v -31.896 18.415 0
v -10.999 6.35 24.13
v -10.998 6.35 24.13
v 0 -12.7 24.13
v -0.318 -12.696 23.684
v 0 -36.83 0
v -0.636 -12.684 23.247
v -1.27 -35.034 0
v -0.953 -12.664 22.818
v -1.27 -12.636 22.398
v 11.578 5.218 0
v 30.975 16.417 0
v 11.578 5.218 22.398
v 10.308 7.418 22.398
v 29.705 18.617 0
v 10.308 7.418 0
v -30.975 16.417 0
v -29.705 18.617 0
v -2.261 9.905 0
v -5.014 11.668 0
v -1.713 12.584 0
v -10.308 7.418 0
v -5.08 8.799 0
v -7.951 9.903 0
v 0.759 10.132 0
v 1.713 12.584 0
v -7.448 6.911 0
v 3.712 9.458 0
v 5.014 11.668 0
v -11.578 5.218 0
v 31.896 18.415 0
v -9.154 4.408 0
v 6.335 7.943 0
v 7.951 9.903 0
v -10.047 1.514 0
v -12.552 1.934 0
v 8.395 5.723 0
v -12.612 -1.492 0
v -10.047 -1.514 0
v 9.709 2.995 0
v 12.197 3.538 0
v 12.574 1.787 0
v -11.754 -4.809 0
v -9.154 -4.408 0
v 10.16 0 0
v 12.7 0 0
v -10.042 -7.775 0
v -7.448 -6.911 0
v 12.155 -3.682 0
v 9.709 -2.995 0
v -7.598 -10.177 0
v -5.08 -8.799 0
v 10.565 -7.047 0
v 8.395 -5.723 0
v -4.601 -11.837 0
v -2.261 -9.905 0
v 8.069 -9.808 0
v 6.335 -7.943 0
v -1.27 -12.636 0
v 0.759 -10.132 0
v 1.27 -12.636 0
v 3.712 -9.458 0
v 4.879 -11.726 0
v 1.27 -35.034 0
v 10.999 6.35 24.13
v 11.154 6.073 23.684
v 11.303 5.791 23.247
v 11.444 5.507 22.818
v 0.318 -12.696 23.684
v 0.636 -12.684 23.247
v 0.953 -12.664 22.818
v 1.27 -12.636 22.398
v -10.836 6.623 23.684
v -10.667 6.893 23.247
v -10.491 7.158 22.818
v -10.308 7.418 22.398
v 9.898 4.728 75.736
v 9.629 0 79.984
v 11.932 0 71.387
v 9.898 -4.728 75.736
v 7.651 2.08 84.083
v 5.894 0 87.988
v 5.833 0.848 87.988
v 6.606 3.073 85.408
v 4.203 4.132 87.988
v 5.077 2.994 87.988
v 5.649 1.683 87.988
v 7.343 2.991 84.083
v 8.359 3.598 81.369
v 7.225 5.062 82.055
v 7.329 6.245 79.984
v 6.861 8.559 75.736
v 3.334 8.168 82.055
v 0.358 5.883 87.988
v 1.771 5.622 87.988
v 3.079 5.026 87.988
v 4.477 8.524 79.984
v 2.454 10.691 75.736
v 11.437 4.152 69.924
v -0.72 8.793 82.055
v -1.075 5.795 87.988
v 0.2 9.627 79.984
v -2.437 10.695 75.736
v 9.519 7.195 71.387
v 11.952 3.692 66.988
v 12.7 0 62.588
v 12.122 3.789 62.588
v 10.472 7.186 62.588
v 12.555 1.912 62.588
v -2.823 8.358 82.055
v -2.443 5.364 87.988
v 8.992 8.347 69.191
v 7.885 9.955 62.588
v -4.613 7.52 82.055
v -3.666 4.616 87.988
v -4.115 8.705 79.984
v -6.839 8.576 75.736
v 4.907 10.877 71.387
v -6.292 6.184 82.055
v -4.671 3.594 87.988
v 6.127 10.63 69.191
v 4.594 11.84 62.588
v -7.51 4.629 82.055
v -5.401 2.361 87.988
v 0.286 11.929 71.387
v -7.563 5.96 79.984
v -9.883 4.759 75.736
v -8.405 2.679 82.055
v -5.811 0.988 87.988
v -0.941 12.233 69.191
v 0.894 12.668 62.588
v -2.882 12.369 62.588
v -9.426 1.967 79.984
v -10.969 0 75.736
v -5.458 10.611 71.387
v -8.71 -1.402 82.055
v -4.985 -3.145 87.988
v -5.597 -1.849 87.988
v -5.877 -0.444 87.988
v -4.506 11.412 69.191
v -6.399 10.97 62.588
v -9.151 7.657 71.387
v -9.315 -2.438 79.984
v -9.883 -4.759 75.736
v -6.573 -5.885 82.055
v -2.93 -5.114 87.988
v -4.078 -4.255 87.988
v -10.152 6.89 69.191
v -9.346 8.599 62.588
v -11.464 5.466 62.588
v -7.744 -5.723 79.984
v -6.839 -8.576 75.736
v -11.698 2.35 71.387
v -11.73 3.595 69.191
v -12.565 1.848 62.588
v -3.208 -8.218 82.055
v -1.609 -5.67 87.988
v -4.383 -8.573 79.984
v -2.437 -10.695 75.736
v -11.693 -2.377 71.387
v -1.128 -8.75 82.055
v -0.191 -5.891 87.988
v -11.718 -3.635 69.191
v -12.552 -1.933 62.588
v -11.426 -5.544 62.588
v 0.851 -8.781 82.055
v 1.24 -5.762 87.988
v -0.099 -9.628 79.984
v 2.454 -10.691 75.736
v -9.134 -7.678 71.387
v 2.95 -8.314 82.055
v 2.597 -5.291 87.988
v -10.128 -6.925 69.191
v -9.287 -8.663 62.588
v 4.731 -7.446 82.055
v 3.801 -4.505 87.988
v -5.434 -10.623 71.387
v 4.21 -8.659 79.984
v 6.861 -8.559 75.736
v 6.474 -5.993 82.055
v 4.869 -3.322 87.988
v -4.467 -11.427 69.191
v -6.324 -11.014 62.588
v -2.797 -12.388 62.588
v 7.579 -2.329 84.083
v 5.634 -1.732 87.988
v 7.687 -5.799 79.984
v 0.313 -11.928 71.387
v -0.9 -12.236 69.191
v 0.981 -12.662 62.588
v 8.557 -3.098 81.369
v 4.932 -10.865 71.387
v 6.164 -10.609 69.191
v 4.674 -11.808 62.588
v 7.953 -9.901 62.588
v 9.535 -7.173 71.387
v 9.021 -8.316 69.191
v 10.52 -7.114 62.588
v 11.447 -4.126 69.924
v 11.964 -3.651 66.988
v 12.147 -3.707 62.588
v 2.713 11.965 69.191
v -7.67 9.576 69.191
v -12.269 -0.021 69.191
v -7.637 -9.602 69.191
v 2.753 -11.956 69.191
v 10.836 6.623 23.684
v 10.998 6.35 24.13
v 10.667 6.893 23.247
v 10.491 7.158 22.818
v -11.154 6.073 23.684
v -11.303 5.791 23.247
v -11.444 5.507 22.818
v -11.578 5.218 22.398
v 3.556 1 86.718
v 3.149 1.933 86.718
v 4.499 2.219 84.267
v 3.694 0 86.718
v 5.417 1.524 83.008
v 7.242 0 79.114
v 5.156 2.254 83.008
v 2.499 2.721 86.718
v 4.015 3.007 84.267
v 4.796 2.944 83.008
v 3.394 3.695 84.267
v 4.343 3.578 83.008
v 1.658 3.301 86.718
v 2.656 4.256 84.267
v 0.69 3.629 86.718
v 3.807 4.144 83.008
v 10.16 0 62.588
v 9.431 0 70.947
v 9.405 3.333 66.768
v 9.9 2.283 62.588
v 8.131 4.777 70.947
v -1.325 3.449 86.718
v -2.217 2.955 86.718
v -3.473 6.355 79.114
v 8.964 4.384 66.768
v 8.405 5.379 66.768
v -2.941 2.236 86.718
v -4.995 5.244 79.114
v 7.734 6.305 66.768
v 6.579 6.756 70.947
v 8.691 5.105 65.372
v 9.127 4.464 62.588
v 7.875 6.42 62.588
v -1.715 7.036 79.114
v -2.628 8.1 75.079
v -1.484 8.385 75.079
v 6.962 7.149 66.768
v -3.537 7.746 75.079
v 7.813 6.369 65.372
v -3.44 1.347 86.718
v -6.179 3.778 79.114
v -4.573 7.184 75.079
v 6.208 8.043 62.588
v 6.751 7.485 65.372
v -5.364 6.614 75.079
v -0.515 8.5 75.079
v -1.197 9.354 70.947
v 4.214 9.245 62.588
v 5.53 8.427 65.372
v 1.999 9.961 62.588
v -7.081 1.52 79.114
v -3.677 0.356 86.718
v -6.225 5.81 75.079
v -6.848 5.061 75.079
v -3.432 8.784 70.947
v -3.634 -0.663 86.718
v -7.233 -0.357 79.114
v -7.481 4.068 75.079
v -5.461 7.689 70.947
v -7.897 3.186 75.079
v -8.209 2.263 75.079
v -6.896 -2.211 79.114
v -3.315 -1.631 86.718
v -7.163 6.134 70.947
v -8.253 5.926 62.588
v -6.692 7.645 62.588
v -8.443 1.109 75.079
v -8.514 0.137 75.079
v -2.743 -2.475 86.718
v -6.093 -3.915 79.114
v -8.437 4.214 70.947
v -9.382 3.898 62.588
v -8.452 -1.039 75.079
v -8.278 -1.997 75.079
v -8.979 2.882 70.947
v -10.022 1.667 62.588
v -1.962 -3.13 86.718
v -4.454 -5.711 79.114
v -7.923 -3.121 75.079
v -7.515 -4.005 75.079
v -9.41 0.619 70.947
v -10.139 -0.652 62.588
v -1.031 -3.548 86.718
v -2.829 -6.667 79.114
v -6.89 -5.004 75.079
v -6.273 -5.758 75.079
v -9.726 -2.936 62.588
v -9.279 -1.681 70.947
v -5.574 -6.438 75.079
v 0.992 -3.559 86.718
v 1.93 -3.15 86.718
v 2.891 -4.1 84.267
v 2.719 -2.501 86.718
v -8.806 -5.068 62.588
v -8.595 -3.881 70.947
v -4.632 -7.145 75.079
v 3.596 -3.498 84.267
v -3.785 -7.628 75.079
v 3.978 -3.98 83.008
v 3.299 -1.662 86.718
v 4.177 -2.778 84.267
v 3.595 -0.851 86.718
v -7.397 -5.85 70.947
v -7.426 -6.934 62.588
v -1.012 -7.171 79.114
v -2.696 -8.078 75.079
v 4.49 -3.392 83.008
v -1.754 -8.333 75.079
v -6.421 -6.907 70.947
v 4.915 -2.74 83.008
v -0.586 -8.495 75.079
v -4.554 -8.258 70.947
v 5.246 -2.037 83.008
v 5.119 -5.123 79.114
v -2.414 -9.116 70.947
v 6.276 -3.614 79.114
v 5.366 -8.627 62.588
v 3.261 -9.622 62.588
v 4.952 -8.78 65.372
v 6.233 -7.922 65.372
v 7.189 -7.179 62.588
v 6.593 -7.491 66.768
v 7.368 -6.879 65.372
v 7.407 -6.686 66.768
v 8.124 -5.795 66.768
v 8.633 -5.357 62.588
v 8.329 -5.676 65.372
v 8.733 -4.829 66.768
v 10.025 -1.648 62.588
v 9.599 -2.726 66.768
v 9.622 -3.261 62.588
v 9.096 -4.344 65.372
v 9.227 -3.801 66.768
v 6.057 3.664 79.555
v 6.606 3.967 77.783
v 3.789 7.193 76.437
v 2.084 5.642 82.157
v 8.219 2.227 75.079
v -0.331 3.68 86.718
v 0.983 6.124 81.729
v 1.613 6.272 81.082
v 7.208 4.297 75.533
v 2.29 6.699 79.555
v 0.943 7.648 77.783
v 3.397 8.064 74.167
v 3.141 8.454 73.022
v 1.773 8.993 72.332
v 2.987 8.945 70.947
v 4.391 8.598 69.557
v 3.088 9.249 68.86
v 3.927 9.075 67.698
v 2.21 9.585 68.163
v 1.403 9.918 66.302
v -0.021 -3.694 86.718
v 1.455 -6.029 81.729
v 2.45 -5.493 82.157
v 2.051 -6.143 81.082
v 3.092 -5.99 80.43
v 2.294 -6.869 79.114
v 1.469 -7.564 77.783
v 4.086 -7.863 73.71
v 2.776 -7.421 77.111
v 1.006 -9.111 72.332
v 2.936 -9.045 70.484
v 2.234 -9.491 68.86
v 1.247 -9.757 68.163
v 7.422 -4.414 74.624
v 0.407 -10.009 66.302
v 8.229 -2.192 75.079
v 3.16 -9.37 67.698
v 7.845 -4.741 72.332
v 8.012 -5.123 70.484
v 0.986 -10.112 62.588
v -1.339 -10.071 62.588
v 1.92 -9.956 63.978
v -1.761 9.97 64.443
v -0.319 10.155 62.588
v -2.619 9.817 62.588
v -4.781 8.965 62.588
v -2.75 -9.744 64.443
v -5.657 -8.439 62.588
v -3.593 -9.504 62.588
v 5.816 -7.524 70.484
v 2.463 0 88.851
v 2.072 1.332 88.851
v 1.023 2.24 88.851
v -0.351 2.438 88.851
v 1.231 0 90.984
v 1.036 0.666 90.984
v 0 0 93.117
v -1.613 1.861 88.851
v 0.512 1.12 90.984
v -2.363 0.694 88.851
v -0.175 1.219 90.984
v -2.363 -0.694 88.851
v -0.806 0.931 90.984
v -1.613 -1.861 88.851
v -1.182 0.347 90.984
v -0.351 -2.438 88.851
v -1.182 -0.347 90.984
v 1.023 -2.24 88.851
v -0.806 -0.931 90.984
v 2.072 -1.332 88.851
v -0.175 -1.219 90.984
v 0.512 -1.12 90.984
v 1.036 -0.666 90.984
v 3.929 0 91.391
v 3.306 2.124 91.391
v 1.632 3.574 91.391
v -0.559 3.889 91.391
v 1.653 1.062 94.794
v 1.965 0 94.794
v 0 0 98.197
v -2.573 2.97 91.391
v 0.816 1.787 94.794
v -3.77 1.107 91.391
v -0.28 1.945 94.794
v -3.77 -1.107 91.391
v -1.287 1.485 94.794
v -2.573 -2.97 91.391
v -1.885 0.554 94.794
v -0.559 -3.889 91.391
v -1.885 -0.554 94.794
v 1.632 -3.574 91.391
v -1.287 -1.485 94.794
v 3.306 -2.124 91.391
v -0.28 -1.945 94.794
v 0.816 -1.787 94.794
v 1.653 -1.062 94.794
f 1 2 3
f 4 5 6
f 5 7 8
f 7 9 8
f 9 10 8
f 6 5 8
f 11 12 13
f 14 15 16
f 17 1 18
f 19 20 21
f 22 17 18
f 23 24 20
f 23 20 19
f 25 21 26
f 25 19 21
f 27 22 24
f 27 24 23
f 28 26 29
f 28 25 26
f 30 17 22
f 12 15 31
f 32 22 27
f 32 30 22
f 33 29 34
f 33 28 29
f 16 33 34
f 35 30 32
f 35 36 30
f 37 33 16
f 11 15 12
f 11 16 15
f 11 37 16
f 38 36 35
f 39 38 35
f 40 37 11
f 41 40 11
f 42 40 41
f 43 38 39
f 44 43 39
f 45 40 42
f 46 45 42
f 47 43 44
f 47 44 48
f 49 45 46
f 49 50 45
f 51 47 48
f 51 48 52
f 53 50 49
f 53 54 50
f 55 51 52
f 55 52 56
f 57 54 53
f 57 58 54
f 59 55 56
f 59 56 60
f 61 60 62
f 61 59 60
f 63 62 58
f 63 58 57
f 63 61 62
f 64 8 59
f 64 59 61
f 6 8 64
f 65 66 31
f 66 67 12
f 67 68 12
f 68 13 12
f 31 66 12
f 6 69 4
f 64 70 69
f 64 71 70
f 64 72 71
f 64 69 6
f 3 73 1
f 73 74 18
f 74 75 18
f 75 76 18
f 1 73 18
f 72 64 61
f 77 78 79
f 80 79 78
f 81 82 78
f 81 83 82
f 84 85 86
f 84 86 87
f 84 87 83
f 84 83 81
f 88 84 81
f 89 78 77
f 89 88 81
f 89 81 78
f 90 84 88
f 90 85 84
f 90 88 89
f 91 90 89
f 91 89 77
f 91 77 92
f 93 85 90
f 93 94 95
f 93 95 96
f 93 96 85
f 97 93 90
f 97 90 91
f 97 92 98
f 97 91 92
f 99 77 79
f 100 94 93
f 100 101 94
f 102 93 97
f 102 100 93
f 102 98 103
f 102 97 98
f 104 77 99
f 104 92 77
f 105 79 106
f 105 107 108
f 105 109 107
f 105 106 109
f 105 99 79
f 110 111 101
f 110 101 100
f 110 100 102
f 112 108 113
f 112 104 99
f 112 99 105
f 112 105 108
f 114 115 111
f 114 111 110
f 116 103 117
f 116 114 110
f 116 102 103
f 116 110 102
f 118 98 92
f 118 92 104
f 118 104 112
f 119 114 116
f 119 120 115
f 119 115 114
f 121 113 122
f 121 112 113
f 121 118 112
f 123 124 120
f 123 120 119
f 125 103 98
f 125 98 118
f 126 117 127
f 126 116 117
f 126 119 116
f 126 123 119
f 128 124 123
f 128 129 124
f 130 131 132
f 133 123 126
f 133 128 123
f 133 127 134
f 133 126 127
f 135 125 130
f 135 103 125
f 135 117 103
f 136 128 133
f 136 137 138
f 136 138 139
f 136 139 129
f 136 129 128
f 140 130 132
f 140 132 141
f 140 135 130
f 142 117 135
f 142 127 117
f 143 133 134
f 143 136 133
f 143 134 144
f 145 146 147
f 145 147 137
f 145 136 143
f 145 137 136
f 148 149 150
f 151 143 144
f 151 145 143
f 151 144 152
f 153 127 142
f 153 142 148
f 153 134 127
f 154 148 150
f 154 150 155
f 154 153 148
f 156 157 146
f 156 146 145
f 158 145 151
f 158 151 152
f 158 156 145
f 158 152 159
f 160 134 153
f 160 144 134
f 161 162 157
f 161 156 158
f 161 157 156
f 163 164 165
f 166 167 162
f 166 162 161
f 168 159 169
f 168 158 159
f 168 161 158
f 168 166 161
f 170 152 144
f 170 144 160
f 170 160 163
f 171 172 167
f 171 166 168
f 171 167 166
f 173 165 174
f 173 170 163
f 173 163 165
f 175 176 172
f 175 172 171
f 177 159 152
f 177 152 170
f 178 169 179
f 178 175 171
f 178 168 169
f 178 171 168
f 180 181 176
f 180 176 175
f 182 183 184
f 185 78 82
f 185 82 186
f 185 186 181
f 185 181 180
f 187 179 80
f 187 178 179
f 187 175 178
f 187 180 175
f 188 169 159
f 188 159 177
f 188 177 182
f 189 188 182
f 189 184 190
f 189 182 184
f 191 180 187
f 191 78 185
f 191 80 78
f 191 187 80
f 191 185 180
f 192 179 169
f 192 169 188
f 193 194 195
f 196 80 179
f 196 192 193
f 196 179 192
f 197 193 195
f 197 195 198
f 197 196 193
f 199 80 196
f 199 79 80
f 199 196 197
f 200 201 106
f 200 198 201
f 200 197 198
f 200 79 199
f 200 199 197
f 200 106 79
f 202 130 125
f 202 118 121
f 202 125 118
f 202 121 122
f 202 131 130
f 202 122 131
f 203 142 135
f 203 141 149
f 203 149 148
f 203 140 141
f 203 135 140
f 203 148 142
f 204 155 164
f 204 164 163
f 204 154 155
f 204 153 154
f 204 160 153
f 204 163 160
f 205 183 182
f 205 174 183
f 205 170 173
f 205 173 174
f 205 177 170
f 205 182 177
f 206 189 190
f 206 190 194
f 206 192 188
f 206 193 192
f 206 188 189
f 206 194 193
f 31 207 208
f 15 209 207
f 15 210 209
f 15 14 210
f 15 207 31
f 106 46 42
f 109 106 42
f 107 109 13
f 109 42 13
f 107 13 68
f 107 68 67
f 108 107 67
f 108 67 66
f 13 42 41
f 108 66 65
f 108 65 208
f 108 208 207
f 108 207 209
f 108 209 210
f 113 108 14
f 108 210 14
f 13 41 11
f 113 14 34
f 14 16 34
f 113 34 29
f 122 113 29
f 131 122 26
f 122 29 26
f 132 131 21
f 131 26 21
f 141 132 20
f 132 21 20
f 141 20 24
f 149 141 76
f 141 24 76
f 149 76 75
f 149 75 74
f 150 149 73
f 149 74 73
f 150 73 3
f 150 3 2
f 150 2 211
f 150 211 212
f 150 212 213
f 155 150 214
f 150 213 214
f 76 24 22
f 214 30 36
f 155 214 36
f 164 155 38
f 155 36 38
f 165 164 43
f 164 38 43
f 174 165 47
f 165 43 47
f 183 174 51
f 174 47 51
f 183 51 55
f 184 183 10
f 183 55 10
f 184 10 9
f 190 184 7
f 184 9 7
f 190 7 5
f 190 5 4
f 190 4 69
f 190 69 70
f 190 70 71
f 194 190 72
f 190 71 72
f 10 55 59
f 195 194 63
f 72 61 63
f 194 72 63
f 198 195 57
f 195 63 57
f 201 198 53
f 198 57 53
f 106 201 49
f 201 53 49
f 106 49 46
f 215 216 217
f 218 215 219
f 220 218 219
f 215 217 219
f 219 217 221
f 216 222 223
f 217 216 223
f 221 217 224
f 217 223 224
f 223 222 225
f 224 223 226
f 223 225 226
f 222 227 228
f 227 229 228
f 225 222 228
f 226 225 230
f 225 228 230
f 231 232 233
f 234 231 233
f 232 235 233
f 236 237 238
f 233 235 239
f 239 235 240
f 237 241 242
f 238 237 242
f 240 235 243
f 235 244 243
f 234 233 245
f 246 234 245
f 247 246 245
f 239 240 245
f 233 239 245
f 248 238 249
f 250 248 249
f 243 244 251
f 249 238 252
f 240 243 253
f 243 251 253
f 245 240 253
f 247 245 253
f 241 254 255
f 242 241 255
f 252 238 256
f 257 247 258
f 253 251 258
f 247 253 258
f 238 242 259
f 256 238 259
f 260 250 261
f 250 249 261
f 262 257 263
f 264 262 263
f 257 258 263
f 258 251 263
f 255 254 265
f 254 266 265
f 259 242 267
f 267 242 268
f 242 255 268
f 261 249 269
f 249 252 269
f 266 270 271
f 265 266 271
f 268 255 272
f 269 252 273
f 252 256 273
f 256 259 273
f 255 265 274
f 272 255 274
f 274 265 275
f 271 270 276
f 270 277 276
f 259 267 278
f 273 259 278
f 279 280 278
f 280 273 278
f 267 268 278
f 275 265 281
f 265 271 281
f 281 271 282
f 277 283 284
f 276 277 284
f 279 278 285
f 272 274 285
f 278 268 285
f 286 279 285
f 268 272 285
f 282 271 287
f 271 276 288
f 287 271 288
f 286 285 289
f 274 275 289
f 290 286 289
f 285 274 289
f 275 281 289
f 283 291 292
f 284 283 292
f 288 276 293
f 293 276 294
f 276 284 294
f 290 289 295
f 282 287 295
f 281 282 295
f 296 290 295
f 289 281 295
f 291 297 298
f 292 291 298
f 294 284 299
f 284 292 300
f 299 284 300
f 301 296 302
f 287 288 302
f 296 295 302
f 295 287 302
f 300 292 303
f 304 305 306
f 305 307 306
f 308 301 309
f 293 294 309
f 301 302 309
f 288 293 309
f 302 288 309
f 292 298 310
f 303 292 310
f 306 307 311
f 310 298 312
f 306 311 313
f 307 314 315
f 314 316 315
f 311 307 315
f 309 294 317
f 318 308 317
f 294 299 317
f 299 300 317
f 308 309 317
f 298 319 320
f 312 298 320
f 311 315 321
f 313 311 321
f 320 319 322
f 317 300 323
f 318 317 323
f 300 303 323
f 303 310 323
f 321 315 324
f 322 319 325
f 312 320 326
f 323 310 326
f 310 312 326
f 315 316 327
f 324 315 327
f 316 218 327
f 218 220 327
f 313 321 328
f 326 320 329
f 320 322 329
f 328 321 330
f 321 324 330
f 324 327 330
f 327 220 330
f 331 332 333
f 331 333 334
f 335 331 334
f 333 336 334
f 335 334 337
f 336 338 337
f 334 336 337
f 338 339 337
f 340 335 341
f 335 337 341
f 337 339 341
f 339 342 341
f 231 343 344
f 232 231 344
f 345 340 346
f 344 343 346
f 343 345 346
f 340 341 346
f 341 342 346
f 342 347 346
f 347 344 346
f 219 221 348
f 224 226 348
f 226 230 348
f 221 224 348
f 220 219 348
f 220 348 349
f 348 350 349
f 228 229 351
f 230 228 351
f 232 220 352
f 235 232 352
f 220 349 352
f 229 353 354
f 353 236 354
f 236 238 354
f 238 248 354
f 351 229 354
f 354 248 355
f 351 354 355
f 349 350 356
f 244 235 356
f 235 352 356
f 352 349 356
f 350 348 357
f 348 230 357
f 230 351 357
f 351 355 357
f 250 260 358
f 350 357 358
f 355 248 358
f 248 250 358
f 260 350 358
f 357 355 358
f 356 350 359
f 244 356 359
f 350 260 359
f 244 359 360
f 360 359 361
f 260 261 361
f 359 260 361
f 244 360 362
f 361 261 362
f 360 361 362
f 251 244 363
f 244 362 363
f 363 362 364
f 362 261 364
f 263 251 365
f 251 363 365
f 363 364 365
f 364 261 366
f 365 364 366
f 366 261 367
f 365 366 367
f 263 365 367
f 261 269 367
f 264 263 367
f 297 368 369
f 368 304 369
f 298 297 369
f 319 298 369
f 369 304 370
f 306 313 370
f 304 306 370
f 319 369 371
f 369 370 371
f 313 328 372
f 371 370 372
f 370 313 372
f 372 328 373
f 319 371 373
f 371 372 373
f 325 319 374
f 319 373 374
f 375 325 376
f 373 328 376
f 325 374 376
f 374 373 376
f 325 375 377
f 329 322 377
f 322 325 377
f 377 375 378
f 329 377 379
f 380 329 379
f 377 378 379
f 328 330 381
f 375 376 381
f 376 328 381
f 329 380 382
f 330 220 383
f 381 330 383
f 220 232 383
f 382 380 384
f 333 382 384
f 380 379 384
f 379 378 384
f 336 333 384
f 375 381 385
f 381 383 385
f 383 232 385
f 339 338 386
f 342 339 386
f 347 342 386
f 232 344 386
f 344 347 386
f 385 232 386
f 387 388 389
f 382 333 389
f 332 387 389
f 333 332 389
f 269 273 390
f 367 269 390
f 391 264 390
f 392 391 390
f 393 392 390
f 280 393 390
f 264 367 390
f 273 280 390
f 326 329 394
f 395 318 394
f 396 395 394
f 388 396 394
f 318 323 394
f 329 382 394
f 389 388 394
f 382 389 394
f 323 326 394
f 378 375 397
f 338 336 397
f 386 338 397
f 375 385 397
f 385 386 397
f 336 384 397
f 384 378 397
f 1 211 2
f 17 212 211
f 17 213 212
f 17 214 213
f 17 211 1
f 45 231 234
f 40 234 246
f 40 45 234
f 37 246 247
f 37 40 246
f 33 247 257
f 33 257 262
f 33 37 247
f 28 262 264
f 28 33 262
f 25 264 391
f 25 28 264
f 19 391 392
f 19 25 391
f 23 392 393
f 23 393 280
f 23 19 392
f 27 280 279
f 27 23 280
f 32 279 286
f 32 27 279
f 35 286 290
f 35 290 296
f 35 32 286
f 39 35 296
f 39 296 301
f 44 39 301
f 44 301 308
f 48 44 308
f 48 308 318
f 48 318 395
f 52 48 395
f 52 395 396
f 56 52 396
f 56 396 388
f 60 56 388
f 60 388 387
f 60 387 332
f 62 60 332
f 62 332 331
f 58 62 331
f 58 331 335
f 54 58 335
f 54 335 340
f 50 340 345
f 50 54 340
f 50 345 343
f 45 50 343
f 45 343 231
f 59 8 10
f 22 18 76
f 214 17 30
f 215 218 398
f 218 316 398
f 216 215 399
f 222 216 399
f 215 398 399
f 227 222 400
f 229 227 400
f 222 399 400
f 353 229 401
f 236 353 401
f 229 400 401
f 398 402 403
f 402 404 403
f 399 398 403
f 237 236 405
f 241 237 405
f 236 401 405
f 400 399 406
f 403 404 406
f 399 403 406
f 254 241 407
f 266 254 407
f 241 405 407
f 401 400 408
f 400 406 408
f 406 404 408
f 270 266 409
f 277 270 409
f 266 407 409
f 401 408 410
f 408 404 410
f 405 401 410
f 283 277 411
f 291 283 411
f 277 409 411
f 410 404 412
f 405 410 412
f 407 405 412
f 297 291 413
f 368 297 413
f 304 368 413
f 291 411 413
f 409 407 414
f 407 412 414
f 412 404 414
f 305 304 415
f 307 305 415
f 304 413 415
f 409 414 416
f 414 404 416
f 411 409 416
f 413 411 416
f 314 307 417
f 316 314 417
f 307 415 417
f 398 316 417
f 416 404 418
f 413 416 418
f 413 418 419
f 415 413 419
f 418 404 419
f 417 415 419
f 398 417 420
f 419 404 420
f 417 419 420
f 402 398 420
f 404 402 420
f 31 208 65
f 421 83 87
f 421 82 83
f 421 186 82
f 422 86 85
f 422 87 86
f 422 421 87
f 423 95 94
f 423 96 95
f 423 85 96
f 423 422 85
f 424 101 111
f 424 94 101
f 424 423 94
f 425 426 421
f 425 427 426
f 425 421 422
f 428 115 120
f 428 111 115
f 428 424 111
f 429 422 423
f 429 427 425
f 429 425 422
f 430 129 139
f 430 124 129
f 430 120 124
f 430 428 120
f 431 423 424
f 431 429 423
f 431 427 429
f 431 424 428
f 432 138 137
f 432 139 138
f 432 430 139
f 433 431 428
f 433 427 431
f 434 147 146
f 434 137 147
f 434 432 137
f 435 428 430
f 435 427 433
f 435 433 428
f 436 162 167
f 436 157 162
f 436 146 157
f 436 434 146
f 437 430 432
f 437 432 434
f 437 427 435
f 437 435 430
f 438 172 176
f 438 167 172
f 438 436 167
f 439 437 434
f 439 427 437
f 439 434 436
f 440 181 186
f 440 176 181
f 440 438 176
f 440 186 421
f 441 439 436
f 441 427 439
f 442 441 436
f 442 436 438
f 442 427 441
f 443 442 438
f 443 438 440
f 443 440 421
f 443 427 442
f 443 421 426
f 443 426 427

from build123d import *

# Parameters (mm, degrees)
F0_R      = 12.7
F1_DEPTH  = 76.2
F1_FACE_R = 12.7
F2_DEPTH  = 25.4
F2_TAPER  = 30
F3_R      = 50.8
F4_T      = -2.54
F6_DEPTH  = 1.27
F7_SIZE   = 1.2699
F8_COUNT  = 3


# Not quite as in the source:
# - a fillet or chamfer is up to 0.001 mm smaller than in the source, because OpenCascade refuses the exact size


with BuildPart() as f1:
    # F0 (on Top) → F1 (new body)
    with BuildSketch(Plane.XY):
        Circle(F0_R)
    extrude(amount=F1_DEPTH)

    # F1_face (on face) → F2 (join)
    with BuildSketch(Plane.XY.offset(76.2)):
        Circle(F1_FACE_R)
    extrude(amount=F2_DEPTH, taper=F2_TAPER)

    # F3
    f3_edges = [f1.edges().sort_by_distance(p)[0] for p in [
        (-12.7, 0, 76.2),
    ]]
    fillet(f3_edges, radius=F3_R)

    # F4
    f4_openings = [f1.faces().sort_by_distance(p)[0] for p in [
        (0, 0, 0),
    ]]
    offset(amount=F4_T, openings=f4_openings)

    # F5 (on Right) → F6 (join, symmetric)
    with BuildSketch(Plane.YZ):
        Polygon((-36.83, 0), (-11.43, 0), (-11.43, 25.4), align=None)
    extrude(amount=F6_DEPTH, both=True)

    # F7 (size 1.27 in the source; OpenCascade refuses exactly that, so slightly less here)
    f7_edges = [f1.edges().sort_by_distance(p)[0] for p in [
        (1.27, -24.73317, 12.09683),
        (-1.27, -24.73317, 12.09683),
    ]]
    chamfer(f7_edges, length=F7_SIZE)

    # F8: F1 ×3 about axis
    f8_axis = Axis((0, 0, 0), (0, 0, 1))


with BuildPart() as f1_1:
    add(f1.part)
    for i in range(1, F8_COUNT):
        add(f1.part.rotate(f8_axis, i * 360 / F8_COUNT))


solid = f1_1.part
